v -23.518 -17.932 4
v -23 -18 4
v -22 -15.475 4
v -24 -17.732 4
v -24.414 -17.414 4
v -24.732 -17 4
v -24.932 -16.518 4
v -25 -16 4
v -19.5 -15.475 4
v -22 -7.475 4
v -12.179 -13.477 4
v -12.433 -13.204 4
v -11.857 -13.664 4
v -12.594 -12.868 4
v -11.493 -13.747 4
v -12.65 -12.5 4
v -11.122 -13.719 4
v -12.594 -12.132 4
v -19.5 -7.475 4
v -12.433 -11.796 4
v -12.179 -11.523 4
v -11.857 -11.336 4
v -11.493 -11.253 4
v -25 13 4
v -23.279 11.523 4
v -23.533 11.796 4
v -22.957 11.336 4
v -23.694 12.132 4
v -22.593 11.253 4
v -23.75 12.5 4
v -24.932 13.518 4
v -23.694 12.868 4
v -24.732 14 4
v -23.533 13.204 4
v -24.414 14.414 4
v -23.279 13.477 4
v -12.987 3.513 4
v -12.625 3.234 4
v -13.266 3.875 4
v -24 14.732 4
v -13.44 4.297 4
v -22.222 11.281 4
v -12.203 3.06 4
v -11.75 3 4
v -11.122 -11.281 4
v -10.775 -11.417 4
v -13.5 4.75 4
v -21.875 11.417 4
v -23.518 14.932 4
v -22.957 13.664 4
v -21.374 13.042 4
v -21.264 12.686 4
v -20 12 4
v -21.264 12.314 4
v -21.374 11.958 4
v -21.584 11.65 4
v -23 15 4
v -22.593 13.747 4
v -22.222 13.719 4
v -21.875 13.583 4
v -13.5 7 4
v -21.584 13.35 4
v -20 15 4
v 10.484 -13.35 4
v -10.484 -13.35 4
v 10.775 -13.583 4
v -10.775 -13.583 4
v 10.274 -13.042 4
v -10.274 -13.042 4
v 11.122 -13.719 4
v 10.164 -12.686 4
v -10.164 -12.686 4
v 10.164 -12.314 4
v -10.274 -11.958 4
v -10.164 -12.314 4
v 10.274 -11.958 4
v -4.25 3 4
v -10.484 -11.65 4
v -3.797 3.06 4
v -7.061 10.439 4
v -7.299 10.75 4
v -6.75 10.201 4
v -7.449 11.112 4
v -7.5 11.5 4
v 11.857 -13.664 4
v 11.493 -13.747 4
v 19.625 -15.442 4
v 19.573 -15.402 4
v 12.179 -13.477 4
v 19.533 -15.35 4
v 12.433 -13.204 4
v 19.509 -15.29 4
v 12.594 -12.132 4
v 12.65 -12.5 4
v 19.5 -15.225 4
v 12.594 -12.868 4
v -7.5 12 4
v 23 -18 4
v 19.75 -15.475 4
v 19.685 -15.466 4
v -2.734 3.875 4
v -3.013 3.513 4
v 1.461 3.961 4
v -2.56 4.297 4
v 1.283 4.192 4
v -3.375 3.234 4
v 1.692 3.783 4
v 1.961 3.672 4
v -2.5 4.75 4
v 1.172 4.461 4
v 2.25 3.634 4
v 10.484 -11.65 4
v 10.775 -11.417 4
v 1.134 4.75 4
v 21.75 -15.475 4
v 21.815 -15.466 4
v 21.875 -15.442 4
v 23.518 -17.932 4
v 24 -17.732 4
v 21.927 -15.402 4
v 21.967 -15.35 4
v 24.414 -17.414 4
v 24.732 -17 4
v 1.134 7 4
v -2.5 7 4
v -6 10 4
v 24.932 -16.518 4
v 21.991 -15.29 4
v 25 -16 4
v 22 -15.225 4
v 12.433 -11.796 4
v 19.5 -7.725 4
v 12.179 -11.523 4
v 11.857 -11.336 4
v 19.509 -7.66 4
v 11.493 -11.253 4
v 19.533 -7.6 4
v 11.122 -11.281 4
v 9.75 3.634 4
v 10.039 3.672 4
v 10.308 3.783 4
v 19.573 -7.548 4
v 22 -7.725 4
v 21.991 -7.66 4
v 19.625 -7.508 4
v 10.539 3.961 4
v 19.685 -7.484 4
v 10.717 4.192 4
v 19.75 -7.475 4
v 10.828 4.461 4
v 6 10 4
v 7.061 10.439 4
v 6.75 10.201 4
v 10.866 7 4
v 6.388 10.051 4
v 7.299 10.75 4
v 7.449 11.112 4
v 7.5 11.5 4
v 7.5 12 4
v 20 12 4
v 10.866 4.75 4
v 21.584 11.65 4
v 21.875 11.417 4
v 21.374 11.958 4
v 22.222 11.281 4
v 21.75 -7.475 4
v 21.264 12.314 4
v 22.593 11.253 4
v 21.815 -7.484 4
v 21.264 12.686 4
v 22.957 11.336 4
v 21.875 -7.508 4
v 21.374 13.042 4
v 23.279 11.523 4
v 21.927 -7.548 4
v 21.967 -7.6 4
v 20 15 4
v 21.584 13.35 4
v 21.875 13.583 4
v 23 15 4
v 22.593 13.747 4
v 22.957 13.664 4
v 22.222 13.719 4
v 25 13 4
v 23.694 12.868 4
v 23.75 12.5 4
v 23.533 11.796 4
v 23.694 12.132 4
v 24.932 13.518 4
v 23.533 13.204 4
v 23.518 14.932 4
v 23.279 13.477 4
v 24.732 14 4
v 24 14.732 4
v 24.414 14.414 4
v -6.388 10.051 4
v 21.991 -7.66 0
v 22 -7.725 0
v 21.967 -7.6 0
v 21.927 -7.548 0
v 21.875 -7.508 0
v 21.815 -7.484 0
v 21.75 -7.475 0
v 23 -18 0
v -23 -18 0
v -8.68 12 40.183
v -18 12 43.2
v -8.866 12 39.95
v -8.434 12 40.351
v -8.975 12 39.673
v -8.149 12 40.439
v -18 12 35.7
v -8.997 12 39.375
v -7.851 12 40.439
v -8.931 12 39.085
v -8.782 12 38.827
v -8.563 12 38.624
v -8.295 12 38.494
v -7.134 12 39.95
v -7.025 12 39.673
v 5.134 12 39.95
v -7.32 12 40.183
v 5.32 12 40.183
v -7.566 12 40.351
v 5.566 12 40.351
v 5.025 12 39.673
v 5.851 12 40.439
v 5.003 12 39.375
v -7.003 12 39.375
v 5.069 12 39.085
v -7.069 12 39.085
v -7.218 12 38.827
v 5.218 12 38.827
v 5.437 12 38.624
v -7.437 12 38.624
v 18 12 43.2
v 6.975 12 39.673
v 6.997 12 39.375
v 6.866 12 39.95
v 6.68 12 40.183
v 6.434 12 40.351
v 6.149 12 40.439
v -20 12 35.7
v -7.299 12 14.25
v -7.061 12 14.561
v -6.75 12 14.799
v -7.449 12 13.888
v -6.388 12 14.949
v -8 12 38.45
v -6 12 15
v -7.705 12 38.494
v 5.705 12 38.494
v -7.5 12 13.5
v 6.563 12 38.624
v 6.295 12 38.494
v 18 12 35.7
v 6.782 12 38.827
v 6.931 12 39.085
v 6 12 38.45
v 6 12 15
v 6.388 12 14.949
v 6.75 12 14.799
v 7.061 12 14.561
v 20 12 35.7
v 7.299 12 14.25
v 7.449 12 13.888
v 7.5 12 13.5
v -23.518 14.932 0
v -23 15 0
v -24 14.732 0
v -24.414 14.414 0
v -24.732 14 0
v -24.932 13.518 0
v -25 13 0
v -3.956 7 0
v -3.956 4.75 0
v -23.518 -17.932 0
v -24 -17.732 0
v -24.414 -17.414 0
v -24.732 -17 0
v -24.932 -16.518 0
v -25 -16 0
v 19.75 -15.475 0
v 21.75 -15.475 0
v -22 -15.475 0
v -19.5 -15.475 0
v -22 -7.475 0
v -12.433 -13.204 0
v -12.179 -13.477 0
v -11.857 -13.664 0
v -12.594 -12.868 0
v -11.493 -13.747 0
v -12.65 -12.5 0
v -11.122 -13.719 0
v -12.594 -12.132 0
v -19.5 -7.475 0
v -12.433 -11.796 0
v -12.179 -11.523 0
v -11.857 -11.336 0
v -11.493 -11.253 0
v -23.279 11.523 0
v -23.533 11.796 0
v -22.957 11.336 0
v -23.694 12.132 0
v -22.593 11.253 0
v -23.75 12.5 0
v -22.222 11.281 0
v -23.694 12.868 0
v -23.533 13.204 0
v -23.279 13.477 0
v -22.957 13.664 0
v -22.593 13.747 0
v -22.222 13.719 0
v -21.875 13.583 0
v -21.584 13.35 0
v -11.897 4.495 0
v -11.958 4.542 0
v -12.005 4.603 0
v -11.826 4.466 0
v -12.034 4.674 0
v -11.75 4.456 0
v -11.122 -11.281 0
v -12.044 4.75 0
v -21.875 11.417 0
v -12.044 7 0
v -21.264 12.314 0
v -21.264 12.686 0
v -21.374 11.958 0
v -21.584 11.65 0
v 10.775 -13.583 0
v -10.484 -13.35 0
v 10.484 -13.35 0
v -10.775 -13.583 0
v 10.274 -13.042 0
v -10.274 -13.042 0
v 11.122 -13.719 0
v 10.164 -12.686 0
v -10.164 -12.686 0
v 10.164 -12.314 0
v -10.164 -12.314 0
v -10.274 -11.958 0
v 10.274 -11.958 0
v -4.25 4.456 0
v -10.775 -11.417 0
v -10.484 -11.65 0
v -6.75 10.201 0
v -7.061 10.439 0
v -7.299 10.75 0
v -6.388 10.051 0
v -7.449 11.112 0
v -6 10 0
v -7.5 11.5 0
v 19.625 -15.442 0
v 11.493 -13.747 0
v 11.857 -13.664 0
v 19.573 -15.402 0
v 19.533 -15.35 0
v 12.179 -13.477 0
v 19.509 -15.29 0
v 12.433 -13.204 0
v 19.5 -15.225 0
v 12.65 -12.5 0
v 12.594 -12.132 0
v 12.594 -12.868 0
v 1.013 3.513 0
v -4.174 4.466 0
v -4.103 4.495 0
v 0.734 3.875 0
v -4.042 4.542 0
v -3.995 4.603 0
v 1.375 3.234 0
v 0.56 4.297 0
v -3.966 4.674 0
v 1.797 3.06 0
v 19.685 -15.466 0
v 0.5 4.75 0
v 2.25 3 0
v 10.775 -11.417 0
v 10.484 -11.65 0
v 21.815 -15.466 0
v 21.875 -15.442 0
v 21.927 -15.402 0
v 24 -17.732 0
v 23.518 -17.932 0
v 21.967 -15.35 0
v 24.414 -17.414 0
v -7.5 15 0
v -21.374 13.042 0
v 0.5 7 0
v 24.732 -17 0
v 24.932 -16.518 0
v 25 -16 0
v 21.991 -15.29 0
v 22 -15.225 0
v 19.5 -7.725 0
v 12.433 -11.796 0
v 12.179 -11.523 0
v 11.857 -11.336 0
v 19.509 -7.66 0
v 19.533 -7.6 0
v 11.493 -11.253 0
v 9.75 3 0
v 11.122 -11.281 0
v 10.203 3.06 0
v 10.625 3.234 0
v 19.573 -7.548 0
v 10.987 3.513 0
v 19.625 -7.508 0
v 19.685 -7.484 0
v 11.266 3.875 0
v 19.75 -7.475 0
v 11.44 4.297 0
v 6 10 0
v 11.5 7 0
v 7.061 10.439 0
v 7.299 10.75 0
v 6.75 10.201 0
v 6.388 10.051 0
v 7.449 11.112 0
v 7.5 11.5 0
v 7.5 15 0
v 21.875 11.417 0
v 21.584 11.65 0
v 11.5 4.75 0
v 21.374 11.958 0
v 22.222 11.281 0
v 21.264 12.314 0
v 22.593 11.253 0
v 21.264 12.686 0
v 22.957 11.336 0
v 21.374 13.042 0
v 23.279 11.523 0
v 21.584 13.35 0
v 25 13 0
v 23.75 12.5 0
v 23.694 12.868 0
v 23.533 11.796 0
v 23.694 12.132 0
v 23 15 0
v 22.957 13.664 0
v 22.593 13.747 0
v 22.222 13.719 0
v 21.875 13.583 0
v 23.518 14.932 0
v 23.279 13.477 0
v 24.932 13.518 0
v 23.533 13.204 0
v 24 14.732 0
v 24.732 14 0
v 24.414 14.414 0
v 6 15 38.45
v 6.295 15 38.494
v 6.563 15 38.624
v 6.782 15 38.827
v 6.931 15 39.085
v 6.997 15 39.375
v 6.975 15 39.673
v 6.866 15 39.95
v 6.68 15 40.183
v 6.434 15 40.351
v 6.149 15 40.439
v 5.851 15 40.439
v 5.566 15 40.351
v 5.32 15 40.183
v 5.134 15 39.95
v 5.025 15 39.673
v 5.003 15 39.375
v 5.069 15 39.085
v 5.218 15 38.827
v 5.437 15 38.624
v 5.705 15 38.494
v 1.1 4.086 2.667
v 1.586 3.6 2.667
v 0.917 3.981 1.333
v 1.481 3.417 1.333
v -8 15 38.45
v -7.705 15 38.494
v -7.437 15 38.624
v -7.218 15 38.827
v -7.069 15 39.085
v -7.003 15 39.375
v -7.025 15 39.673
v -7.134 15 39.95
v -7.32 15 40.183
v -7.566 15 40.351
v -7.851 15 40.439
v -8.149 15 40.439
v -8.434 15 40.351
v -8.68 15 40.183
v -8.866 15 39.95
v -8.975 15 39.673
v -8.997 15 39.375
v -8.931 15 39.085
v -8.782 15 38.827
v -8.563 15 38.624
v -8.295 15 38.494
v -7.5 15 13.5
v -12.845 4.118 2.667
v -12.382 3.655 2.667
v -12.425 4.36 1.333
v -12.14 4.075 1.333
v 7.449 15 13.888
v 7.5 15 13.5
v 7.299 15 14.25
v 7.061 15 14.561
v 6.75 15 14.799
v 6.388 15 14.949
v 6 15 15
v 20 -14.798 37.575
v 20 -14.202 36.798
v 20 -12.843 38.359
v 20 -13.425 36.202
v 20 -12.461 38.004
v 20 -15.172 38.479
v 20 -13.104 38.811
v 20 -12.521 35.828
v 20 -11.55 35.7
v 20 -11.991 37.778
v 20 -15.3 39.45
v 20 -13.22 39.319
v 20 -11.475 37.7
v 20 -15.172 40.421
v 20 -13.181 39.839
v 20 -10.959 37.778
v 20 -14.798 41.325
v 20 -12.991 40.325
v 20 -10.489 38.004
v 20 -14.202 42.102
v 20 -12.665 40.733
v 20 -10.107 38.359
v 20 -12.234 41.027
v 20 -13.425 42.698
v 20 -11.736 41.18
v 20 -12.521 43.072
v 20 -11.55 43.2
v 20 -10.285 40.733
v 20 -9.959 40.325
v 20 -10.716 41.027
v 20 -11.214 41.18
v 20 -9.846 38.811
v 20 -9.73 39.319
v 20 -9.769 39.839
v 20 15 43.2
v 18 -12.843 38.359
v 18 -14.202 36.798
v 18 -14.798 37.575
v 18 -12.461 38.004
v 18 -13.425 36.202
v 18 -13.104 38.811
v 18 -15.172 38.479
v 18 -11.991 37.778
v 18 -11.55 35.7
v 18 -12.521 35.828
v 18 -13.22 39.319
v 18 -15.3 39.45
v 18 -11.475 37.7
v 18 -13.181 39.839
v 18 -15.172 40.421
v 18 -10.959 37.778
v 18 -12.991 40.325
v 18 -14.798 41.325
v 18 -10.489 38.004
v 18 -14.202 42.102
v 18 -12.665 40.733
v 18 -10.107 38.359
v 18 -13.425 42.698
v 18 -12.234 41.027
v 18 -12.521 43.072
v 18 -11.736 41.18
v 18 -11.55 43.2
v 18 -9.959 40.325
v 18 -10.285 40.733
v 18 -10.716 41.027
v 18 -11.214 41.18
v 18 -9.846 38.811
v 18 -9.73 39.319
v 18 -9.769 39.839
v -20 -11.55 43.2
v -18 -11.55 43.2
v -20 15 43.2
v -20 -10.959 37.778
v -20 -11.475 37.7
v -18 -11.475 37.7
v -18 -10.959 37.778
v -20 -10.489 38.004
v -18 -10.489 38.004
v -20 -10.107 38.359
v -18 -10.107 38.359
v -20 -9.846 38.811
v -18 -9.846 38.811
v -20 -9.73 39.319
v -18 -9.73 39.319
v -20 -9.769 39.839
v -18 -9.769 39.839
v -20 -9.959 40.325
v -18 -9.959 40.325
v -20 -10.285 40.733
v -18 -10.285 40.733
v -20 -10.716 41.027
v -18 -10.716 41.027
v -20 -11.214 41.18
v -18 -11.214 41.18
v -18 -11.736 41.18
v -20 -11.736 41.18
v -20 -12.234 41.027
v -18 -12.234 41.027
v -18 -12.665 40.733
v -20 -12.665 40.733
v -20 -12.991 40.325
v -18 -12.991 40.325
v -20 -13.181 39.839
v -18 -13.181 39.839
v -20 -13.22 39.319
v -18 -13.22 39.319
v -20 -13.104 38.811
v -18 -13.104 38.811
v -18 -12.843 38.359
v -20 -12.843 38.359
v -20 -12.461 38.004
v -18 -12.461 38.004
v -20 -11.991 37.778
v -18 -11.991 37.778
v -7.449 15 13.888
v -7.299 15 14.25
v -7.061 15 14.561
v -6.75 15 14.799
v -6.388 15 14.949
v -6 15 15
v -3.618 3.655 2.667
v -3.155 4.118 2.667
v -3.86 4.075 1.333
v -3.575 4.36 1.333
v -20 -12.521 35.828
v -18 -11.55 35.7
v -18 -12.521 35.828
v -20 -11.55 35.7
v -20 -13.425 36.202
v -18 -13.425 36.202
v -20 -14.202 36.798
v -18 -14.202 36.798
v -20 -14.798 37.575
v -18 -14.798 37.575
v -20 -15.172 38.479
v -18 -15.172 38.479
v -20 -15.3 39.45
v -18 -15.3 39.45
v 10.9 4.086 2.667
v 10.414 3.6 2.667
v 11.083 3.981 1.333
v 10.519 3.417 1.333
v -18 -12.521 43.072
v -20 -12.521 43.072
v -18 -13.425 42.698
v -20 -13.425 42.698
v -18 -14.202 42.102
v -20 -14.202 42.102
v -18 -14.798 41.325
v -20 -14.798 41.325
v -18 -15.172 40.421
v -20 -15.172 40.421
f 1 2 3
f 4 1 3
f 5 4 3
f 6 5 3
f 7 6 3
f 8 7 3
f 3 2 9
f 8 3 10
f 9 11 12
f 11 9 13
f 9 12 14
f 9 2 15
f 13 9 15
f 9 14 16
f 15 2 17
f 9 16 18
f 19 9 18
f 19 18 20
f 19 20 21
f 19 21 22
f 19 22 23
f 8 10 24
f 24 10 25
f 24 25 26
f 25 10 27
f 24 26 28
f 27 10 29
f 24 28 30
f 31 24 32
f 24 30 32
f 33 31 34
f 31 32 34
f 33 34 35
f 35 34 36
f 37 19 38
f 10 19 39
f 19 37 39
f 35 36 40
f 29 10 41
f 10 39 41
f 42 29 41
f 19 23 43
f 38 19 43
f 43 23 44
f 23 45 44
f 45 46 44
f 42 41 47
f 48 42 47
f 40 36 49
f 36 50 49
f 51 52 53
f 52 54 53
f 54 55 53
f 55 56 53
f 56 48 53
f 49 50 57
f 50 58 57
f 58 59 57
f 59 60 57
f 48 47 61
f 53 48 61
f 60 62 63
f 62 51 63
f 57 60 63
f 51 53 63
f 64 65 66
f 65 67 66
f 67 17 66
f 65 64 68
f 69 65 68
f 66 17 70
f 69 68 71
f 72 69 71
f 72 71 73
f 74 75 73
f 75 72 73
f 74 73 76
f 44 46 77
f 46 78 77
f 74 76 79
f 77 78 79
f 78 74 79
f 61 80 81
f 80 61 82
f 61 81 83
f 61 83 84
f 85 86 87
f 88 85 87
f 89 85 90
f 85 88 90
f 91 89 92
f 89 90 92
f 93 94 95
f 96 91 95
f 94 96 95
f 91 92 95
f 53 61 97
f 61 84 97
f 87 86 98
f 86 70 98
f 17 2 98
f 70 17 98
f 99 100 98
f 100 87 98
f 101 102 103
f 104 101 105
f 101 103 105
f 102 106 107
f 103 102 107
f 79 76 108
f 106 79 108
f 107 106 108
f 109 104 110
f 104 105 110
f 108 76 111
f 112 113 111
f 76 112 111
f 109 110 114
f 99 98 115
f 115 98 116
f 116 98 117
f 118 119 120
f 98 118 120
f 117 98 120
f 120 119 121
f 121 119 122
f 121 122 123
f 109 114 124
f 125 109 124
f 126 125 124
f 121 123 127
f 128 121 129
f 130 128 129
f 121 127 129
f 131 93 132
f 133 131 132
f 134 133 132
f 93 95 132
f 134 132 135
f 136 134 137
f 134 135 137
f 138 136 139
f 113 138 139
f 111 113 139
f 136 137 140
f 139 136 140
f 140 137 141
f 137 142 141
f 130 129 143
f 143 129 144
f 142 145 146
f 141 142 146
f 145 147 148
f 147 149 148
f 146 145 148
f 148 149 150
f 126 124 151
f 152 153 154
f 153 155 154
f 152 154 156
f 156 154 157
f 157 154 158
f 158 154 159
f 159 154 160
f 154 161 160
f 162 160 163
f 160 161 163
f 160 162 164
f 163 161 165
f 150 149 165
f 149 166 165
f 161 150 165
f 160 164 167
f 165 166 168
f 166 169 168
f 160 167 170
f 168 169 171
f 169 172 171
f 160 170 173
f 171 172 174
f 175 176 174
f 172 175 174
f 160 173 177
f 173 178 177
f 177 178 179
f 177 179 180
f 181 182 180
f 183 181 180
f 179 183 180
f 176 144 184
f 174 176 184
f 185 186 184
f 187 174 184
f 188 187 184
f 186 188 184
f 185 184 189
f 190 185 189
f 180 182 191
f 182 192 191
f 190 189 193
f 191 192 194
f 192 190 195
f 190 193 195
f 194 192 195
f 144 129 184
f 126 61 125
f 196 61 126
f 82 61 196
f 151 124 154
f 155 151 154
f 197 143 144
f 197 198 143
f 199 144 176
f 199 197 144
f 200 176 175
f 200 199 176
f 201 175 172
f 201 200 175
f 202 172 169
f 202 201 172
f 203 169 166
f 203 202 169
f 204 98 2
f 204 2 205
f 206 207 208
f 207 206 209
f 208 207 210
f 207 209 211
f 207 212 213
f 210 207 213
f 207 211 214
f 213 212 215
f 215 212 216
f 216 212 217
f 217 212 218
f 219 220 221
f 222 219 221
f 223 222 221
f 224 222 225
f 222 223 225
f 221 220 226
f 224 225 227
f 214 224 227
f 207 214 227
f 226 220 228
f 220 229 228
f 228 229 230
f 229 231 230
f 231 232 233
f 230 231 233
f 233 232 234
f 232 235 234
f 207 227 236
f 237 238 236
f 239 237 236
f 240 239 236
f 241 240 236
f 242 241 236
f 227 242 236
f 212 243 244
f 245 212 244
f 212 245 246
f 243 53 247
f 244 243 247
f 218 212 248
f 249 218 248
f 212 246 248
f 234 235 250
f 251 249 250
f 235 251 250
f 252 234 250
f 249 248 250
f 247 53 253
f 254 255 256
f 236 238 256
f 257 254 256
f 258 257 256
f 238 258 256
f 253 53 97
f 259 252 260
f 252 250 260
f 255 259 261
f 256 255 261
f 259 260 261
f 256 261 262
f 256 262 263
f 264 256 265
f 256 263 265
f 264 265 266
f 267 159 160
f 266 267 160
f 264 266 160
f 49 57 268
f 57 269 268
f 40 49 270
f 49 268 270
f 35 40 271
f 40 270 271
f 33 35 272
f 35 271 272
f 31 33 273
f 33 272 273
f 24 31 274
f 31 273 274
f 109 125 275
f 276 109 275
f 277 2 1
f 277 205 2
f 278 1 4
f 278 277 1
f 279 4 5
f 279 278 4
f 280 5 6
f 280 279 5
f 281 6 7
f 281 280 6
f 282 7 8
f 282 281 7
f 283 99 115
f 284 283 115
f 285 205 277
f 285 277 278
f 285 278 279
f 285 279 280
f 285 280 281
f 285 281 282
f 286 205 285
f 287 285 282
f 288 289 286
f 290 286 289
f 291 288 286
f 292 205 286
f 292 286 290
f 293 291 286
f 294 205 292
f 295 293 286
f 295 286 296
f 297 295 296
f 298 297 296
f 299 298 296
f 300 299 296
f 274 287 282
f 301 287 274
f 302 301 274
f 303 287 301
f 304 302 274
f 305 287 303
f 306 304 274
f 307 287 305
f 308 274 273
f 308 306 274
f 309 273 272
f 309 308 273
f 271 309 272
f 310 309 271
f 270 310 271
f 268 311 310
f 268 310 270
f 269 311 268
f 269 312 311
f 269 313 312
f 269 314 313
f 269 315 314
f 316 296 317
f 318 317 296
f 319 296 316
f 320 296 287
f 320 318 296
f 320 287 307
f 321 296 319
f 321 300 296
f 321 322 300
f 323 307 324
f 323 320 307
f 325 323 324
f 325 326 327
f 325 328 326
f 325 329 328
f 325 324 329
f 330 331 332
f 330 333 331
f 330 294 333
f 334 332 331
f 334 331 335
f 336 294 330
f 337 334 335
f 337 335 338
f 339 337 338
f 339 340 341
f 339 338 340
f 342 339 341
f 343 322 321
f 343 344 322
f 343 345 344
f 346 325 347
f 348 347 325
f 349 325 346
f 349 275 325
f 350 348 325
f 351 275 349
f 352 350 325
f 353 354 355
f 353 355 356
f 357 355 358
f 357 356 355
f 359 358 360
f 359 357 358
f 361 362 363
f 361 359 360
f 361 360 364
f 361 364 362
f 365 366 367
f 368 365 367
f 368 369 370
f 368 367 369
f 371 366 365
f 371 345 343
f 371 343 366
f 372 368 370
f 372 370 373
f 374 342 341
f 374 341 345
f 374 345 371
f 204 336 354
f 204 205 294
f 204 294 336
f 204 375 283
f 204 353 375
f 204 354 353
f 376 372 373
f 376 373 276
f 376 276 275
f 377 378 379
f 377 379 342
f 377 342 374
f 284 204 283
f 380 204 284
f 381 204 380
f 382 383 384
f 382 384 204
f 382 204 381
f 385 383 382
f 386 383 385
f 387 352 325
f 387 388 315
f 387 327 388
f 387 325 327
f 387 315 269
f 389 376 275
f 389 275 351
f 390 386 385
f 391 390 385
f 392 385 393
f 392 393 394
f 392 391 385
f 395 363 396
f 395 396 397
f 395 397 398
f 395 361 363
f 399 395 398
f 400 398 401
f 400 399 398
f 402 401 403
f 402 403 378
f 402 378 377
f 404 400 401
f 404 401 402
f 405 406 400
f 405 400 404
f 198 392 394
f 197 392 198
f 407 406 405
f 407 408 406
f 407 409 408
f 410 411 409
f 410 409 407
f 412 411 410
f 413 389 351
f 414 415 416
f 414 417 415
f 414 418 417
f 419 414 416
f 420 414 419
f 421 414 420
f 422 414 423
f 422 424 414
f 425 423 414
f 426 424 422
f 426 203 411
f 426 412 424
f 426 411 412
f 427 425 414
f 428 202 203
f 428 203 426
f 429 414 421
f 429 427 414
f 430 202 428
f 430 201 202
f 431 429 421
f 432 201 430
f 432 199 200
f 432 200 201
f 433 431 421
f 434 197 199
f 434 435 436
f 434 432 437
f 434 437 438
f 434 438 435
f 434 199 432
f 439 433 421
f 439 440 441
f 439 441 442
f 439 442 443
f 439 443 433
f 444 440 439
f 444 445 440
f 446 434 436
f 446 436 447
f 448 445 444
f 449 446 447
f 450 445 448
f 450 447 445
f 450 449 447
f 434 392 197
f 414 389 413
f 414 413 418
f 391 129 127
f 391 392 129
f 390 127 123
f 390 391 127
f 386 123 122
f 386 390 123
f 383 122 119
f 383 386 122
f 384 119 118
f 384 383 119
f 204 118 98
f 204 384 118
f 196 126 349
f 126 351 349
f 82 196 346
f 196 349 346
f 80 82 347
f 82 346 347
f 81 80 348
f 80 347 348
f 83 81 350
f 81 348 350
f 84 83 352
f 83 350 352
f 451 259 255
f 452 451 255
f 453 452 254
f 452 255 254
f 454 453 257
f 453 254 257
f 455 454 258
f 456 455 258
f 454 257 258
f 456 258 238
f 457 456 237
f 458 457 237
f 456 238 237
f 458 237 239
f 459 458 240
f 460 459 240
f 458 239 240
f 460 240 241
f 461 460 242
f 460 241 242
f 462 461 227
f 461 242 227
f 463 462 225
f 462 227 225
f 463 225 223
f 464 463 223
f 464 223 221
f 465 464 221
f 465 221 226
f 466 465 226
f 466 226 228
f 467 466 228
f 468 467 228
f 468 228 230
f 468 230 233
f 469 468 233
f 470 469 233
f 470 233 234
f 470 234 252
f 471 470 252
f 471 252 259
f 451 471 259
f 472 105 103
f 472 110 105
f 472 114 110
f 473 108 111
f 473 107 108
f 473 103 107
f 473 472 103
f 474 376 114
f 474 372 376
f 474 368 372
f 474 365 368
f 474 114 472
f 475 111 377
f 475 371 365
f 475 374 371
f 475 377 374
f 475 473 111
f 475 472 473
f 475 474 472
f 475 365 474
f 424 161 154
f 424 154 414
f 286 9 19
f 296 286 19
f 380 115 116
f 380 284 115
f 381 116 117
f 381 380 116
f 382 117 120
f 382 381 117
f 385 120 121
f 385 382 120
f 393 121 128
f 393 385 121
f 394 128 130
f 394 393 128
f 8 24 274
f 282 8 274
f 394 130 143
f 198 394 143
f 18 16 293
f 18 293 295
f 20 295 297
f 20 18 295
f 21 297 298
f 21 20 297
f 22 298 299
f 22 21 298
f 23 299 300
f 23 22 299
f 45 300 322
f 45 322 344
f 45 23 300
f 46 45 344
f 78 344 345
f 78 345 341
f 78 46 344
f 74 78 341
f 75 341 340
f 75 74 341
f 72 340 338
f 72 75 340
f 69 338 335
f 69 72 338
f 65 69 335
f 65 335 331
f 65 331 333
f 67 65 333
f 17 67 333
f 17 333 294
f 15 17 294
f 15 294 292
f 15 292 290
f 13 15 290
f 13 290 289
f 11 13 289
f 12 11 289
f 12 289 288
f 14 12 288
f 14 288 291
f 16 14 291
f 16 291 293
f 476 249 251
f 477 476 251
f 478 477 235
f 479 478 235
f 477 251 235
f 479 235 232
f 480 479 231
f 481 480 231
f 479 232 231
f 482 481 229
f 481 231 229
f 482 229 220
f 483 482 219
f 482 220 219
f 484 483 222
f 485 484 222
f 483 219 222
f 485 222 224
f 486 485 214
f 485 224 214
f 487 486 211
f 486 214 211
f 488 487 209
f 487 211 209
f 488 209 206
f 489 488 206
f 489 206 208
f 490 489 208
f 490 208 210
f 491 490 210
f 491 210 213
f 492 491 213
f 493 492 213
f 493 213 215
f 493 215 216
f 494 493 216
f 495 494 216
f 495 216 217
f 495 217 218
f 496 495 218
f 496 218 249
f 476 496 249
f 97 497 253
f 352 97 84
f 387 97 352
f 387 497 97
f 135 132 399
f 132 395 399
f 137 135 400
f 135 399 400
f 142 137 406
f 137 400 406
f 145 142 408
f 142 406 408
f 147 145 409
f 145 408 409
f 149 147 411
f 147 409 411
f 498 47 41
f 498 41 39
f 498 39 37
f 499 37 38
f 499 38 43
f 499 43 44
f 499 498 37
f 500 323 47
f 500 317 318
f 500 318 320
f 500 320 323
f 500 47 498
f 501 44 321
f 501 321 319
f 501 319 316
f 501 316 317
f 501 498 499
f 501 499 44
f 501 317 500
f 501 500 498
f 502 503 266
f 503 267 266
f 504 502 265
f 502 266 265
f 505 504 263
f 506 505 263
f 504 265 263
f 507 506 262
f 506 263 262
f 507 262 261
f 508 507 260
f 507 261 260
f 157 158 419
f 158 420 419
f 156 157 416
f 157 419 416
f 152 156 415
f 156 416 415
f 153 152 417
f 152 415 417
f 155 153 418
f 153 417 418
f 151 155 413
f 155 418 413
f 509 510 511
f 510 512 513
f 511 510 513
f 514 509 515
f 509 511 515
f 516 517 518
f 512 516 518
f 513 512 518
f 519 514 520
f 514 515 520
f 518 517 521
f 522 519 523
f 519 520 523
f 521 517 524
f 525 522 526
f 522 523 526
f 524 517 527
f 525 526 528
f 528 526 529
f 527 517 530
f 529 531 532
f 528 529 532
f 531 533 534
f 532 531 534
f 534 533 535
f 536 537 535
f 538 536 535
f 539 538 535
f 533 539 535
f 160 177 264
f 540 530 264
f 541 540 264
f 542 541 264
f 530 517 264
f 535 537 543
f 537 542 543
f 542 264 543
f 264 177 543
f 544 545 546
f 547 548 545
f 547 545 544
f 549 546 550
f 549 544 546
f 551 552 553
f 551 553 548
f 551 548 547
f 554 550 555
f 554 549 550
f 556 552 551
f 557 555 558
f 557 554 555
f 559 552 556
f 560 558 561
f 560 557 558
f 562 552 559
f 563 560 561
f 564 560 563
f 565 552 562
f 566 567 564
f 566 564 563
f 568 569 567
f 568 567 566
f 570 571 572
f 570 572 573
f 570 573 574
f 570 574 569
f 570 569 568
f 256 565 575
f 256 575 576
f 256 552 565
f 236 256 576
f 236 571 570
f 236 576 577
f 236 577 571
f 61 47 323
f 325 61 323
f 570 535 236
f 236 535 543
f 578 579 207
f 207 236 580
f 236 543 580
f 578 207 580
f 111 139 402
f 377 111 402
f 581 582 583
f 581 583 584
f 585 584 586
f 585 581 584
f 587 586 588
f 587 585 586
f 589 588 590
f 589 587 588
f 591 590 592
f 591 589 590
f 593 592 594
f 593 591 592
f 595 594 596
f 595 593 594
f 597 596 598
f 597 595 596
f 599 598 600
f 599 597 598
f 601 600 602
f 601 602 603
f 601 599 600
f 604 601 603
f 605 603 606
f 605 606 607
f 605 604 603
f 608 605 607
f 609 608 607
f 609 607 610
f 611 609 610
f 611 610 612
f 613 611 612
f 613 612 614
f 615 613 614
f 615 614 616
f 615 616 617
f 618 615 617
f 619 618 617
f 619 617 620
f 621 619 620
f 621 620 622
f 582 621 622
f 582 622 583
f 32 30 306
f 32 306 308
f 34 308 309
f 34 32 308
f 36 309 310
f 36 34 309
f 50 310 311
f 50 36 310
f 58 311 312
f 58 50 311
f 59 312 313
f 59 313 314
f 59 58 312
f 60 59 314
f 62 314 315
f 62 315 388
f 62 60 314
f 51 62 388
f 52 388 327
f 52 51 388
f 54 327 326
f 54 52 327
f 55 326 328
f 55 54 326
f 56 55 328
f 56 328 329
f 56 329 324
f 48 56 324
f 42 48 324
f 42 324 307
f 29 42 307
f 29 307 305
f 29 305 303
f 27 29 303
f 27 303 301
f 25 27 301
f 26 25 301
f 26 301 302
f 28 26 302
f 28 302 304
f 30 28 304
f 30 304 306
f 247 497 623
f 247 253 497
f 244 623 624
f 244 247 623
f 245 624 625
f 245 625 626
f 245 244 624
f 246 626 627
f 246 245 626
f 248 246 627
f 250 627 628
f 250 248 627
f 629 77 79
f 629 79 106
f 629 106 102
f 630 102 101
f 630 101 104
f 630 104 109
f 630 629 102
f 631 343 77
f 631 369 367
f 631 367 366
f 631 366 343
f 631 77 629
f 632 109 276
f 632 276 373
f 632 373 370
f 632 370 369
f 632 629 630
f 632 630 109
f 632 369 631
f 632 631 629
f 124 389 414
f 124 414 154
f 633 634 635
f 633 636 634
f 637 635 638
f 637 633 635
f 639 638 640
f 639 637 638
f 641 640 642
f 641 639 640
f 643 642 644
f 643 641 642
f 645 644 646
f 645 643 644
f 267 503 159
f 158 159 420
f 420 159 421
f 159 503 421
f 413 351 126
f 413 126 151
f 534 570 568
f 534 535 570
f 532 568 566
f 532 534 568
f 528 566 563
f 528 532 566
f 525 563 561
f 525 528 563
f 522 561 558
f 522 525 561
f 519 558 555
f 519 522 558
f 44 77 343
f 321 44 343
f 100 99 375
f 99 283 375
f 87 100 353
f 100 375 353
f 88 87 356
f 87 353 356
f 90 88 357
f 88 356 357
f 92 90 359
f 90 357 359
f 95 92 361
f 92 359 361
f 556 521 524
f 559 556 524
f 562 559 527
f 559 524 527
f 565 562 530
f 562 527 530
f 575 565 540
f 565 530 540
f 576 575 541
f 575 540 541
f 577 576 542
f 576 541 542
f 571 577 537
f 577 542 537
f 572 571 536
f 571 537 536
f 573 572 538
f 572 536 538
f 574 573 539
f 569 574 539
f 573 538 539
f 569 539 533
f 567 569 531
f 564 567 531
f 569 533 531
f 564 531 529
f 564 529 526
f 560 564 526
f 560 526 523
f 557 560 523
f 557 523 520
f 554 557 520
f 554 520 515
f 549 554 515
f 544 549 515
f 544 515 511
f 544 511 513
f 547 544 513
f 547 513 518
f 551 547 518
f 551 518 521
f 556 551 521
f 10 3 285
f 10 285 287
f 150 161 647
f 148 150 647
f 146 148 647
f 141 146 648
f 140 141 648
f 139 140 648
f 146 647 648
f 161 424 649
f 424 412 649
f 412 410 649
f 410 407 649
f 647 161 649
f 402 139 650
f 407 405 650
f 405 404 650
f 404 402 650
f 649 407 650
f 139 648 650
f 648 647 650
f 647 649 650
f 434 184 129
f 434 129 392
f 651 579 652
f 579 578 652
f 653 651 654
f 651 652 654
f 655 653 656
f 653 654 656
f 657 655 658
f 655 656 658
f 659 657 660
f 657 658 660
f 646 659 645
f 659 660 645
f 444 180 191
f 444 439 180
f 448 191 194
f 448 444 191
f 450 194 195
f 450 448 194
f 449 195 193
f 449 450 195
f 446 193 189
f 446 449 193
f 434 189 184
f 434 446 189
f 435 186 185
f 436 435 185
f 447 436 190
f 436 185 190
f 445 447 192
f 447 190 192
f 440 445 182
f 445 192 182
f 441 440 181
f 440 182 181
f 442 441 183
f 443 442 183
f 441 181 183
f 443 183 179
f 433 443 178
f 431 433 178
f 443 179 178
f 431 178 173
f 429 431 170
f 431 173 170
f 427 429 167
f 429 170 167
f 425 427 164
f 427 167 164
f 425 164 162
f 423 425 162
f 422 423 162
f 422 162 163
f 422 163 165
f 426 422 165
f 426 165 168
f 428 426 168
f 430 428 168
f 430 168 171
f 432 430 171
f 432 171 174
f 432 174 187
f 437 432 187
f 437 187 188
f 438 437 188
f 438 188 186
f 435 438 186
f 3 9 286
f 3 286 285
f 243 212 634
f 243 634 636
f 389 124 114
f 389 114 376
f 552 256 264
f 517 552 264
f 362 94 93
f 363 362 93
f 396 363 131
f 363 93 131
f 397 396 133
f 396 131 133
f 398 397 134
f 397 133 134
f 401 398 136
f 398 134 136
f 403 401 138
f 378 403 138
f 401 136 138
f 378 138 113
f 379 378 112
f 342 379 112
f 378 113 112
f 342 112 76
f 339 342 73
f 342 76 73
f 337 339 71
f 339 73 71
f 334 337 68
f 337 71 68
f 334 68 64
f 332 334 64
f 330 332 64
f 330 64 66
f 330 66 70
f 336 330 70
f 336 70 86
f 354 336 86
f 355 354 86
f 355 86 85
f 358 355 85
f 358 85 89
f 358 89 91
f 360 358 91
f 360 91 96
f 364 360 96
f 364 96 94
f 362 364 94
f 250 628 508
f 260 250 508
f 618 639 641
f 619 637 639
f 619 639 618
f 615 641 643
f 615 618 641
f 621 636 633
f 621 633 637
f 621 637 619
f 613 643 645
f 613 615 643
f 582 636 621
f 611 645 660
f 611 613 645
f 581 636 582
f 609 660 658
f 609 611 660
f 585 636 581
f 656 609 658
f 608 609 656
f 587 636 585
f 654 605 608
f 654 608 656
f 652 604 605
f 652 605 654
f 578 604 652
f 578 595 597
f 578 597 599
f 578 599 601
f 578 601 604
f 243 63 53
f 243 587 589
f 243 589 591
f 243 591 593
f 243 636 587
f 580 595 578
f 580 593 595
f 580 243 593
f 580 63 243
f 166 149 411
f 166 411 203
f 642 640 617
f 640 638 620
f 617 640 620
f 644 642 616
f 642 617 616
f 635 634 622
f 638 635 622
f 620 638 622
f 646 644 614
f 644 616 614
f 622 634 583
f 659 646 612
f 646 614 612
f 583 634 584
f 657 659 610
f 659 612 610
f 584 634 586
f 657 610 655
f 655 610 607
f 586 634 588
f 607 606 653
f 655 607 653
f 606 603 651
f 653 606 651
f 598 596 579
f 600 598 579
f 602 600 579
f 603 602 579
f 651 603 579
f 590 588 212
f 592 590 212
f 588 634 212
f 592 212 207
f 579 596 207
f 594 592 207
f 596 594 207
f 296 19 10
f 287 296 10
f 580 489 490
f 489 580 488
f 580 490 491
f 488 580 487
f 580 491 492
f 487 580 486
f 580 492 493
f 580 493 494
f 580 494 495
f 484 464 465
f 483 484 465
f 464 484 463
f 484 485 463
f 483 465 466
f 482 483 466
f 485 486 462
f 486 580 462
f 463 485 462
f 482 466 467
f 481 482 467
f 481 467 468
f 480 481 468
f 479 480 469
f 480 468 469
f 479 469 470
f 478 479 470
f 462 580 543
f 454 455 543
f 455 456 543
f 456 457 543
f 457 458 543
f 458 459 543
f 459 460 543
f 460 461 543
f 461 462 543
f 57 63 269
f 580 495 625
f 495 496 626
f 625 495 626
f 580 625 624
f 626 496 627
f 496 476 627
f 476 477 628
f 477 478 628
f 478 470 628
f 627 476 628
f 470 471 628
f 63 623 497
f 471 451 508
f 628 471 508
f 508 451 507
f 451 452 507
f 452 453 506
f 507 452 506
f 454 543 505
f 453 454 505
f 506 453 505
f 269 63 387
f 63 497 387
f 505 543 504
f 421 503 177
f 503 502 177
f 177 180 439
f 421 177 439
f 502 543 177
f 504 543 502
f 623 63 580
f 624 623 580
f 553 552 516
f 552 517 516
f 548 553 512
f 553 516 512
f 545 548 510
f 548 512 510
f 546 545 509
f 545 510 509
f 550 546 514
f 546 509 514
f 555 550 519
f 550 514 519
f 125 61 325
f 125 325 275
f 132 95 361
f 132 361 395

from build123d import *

# Parameters (mm, degrees)
SKETCH1_W             = 40
SKETCH1_H             = 33
BOSS_EXTRUDE1_DEPTH   = 4
SKETCH3_W             = 40
SKETCH3_H             = 3
BOSS_EXTRUDE2_DEPTH   = 39.2
SKETCH10_W            = 2
SKETCH10_H            = 7.5
BOSS_EXTRUDE3_DEPTH   = 27.3
SKETCH12_W            = 4
SKETCH12_H            = 33
BOSS_EXTRUDE4_DEPTH   = 5
SKETCH13_W            = 2.5
SKETCH13_H            = 8
CUT_EXTRUDE5_DEPTH    = 50.856193196
CUT_EXTRUDE6_REACH    = 63.565
SKETCH15_R            = 1.75
FILLET6_R             = 3.75
CUT_EXTRUDE8_REACH    = 51.856
SKETCH23_R            = 1.25
FILLET8_R             = 2
SKETCH25_R            = 1
CUT_EXTRUDE10_DEPTH   = 59.234354122
SKETCH26_W            = 8
SKETCH26_H            = 2.5
CUT_EXTRUDE11_DEPTH   = 50.856193196
FILLET3_R             = 0.25
FILLET6_OF_MIRROR10_R = 3.75
FILLET8_OF_MIRROR10_R = 2
SKETCH28_W            = 8
SKETCH28_H            = 2.5
CUT_EXTRUDE12_DEPTH   = 50.856193196
FILLET9_R             = 0.25
CHAMFER1_SIZE         = 1.5
CHAMFER1_SIZE_2       = 4.121216129
CHAMFER2_SIZE         = 9.470627272
CHAMFER2_SIZE_2       = 1.5
SKETCH29_W            = 15
SKETCH29_H            = 15
CUT_EXTRUDE13_DEPTH   = 5
FILLET10_R            = 1.5


# Some blends are built 0.0001 mm under size
with BuildPart() as part:
    # Sketch1 → Boss-Extrude1 (new body)
    with BuildSketch(Plane.XY):
        with Locations((0, -1.5)):
            Rectangle(SKETCH1_W, SKETCH1_H)
    extrude(amount=BOSS_EXTRUDE1_DEPTH)

    # Sketch3 → Boss-Extrude2 (add)
    with BuildSketch(Plane.XY.offset(4)):
        with Locations((0, 13.5)):
            Rectangle(SKETCH3_W, SKETCH3_H)
    extrude(amount=BOSS_EXTRUDE2_DEPTH)

    # Sketch10 → Boss-Extrude3 (add)
    with BuildSketch(Plane.XZ.offset(-12)):
        with Locations((19, 39.45)):
            Rectangle(SKETCH10_W, SKETCH10_H)
    boss_extrude3 = extrude(amount=BOSS_EXTRUDE3_DEPTH)

    # Sketch12 → Boss-Extrude4 (add)
    with BuildSketch(Plane(origin=(20, 0, 0), x_dir=(0, 0, -1), z_dir=(1, 0, 0))):
        with Locations((-2, -1.5)):
            Rectangle(SKETCH12_W, SKETCH12_H)
    boss_extrude4 = extrude(amount=BOSS_EXTRUDE4_DEPTH)

    # Sketch13 → Cut-Extrude5 (cut, through all)
    with BuildSketch(Plane.XY.offset(4)):
        with Locations((20.75, -11.475)):
            Rectangle(SKETCH13_W, SKETCH13_H)
    cut_extrude5 = extrude(amount=-CUT_EXTRUDE5_DEPTH, mode=Mode.SUBTRACT)

    # Sketch15 → Cut-Extrude6 (cut, up to next)
    with BuildSketch(Plane(origin=(20, 0, 0), x_dir=(0, 0, -1), z_dir=(1, 0, 0)), mode=Mode.PRIVATE) as cut_extrude6_sk1:
        with Locations((-39.45, -11.475)):
            Circle(SKETCH15_R)
    cut_extrude6_tool1 = extrude(cut_extrude6_sk1.sketch, amount=-CUT_EXTRUDE6_REACH, mode=Mode.PRIVATE) & part.part
    cut_extrude6 = cut_extrude6_tool1.solids().sort_by_distance((20, -11.475, 39.45))[0]
    add(cut_extrude6, mode=Mode.SUBTRACT)

    # Fillet6
    fillet6_edges = [part.edges().sort_by_distance(p)[0] for p in [
        (19, -15.3, 35.7),
        (19, -15.3, 43.2),
    ]]
    fillet(fillet6_edges, radius=FILLET6_R - 0.0001)  # a hair under: the kernel refuses the full size

    # Sketch23 → Cut-Extrude8 (cut, up to next)
    with BuildSketch(Plane.XY.offset(4), mode=Mode.PRIVATE) as cut_extrude8_sk1:
        with Locations((11.4, -12.5)):
            Circle(SKETCH23_R)
    cut_extrude8_tool1 = extrude(cut_extrude8_sk1.sketch, amount=-CUT_EXTRUDE8_REACH, mode=Mode.PRIVATE) & part.part
    # Sketch23 → Cut-Extrude8 (cut, up to next)
    with BuildSketch(Plane.XY.offset(4), mode=Mode.PRIVATE) as cut_extrude8_sk2:
        with Locations((22.5, 12.5)):
            Circle(SKETCH23_R)
    cut_extrude8_tool2 = extrude(cut_extrude8_sk2.sketch, amount=-CUT_EXTRUDE8_REACH, mode=Mode.PRIVATE) & part.part
    cut_extrude8_1 = cut_extrude8_tool1.solids().sort_by_distance((11.4, -12.5, 4))[0]
    add(cut_extrude8_1, mode=Mode.SUBTRACT)
    cut_extrude8_2 = cut_extrude8_tool2.solids().sort_by_distance((22.5, 12.5, 4))[0]
    add(cut_extrude8_2, mode=Mode.SUBTRACT)
    cut_extrude8 = cut_extrude8_1 + cut_extrude8_2  # Cut-Extrude8 as one shape, for the pattern or mirror that repeats it

    # Fillet8
    fillet8_edges = [part.edges().sort_by_distance(p)[0] for p in [
        (25, 15, 2),
        (25, -18, 2),
    ]]
    fillet(fillet8_edges, radius=FILLET8_R)

    # Sketch25 → Cut-Extrude10 (cut, through all)
    with BuildSketch(Plane.XZ.offset(-12)):
        with Locations(Location((6, 39.45, 0), (0, 0, 270))):
            Circle(SKETCH25_R)
        with Locations(Location((-8, 39.45, 0), (0, 0, 270))):
            Circle(SKETCH25_R)
    extrude(amount=-CUT_EXTRUDE10_DEPTH, mode=Mode.SUBTRACT)

    # Sketch26 → Cut-Extrude11 (cut, through all)
    with BuildSketch(Plane.XY.offset(4)):
        with Locations((6, 5.75)):
            Rectangle(SKETCH26_W, SKETCH26_H)
    extrude(amount=-CUT_EXTRUDE11_DEPTH, mode=Mode.SUBTRACT)

    # Fillet3
    fillet3_edges = [part.edges().sort_by_distance(p)[0] for p in [
        (22, -7.475, 2),
        (22, -15.475, 2),
        (19.5, -15.475, 2),
        (19.5, -7.475, 2),
    ]]
    fillet(fillet3_edges, radius=FILLET3_R)

    # Mirror10: Boss-Extrude3, Boss-Extrude4, Cut-Extrude5, Cut-Extrude6, Cut-Extrude8 across plane
    add(boss_extrude3.mirror(Plane(origin=(0, 0, 0), x_dir=(0, 0, 1), z_dir=(1, 0, 0))))
    add(boss_extrude4.mirror(Plane(origin=(0, 0, 0), x_dir=(0, 0, 1), z_dir=(1, 0, 0))))
    add(cut_extrude5.mirror(Plane(origin=(0, 0, 0), x_dir=(0, 0, 1), z_dir=(1, 0, 0))), mode=Mode.SUBTRACT)
    add(cut_extrude6.mirror(Plane(origin=(0, 0, 0), x_dir=(0, 0, 1), z_dir=(1, 0, 0))), mode=Mode.SUBTRACT)
    add(cut_extrude8.mirror(Plane(origin=(0, 0, 0), x_dir=(0, 0, 1), z_dir=(1, 0, 0))), mode=Mode.SUBTRACT)

    # Fillet6 of Mirror10
    fillet6_of_mirror10_edges = [part.edges().sort_by_distance(p)[0] for p in [
        (-19, -15.3, 35.7),
        (-19, -15.3, 43.2),
    ]]
    fillet(fillet6_of_mirror10_edges, radius=FILLET6_OF_MIRROR10_R - 0.0001)  # a hair under: the kernel refuses the full size

    # Fillet8 of Mirror10
    fillet8_of_mirror10_edges = [part.edges().sort_by_distance(p)[0] for p in [
        (-25, 15, 2),
        (-25, -18, 2),
    ]]
    fillet(fillet8_of_mirror10_edges, radius=FILLET8_OF_MIRROR10_R)

    # Sketch28 → Cut-Extrude12 (cut, through all)
    with BuildSketch(Plane.XY.offset(4)):
        with Locations((-8, 5.75)):
            Rectangle(SKETCH28_W, SKETCH28_H)
    extrude(amount=-CUT_EXTRUDE12_DEPTH, mode=Mode.SUBTRACT)

    # Fillet9
    fillet9_edges = [part.edges().sort_by_distance(p)[0] for p in [
        (10, 4.5, 2),
        (2, 4.5, 2),
        (-12, 4.5, 2),
        (-4, 4.5, 2),
    ]]
    fillet(fillet9_edges, radius=FILLET9_R)

    # Chamfer1
    # the kernel refuses this chamfer: 4.121216129, 1.5 mm, written as the material it takes off along each edge
    with BuildSketch(Plane(origin=(-12, 4.75, 4), x_dir=(-0.9950833631817486, 0, 0.09904090225205062), z_dir=(0, 1, 0)), Plane(origin=(-4, 7, 4), x_dir=(0.9950833631817486, 0, 0.09904090225205064), z_dir=(0, -1, 0))) as chamfer1_piece_1:
        Polygon((CHAMFER1_SIZE * 0.995083363182, -CHAMFER1_SIZE * 0.0990409022521), (-CHAMFER1_SIZE_2 * 0.0990409022564, -CHAMFER1_SIZE_2 * 0.995083363226), (0, 0), align=None)
    extrude(amount=2.25, mode=Mode.SUBTRACT)
    with BuildSketch(Plane(origin=(-11.75, 4.75, 4), x_dir=(-1, 0, 0), z_dir=(0, 1, 0))) as chamfer1_piece_2:
        Polygon((0.25 + CHAMFER1_SIZE, 0), (0.25, -CHAMFER1_SIZE_2), (0.25, 0), align=None)
    revolve(axis=Axis((-11.75, 4.75, 4), (0, 0, 1)), revolution_arc=90, mode=Mode.SUBTRACT)
    with BuildSketch(Plane(origin=(-4.25, 4.75, 4), x_dir=(0, -1, 0), z_dir=(-1, 0, 0))) as chamfer1_piece_3:
        Polygon((0.25 + CHAMFER1_SIZE, 0), (0.25, -CHAMFER1_SIZE_2), (0.25, 0), align=None)
    revolve(axis=Axis((-4.25, 4.75, 4), (0, 0, 1)), revolution_arc=90, mode=Mode.SUBTRACT)
    with BuildSketch(Plane(origin=(-4.25, 4.5, 4), x_dir=(0, -0.9950833631817486, 0.09904090225205064), z_dir=(-1, 0, 0))) as chamfer1_piece_4:
        Polygon((CHAMFER1_SIZE * 0.995083363182, -CHAMFER1_SIZE * 0.0990409022521), (-CHAMFER1_SIZE_2 * 0.0990409022564, -CHAMFER1_SIZE_2 * 0.995083363226), (0, 0), align=None)
    extrude(amount=7.5, mode=Mode.SUBTRACT)

    # Chamfer2
    # the kernel refuses this chamfer: 9.470627272, 1.5 mm, written as the material it takes off along each edge
    with BuildSketch(Plane(origin=(2, 7, 0), x_dir=(0.006019451551713046, 0, 0.9999818829373942), z_dir=(0, -1, 0)), Plane(origin=(10, 4.75, 0), x_dir=(-0.006019451551713001, 0, 0.9999818829373942), z_dir=(0, 1, 0))) as chamfer2_piece_1:
        Polygon((CHAMFER2_SIZE * 0.999981882939, CHAMFER2_SIZE * 0.00601945155172), (-CHAMFER2_SIZE_2 * 0.00601945155171, CHAMFER2_SIZE_2 * 0.999981882937), (0, 0), align=None)
    extrude(amount=2.25, mode=Mode.SUBTRACT)
    with BuildSketch(Plane(origin=(2.25, 4.75, 0), x_dir=(-1, 0, 0), z_dir=(0, 1, 0))) as chamfer2_piece_2:
        Polygon((0.25, CHAMFER2_SIZE), (0.25 + CHAMFER2_SIZE_2, 0), (0.25, 0), align=None)
    revolve(axis=Axis((2.25, 4.75, 0), (0, 0, 1)), revolution_arc=90, mode=Mode.SUBTRACT)
    with BuildSketch(Plane(origin=(9.75, 4.75, 0), x_dir=(1, 0, 0), z_dir=(0, 1, 0))) as chamfer2_piece_3:
        Polygon((0.25, -CHAMFER2_SIZE), (0.25 + CHAMFER2_SIZE_2, 0), (0.25, 0), align=None)
    revolve(axis=Axis((9.75, 4.75, 0), (0, 0, -1)), revolution_arc=90, mode=Mode.SUBTRACT)
    with BuildSketch(Plane(origin=(2.25, 4.5, 0), x_dir=(0, 0.006019451551713091, 0.9999818829373942), z_dir=(1, 0, 0))) as chamfer2_piece_4:
        Polygon((CHAMFER2_SIZE * 0.999981882939, CHAMFER2_SIZE * 0.00601945155172), (-CHAMFER2_SIZE_2 * 0.00601945155171, CHAMFER2_SIZE_2 * 0.999981882937), (0, 0), align=None)
    extrude(amount=7.5, mode=Mode.SUBTRACT)

    # Sketch29 → Cut-Extrude13 (cut)
    with BuildSketch(Plane(origin=(0, 15, 0), x_dir=(1, 0, 0), z_dir=(0, 1, 0))):
        with Locations((0, -7.5)):
            Rectangle(SKETCH29_W, SKETCH29_H)
    extrude(amount=-CUT_EXTRUDE13_DEPTH, mode=Mode.SUBTRACT)

    # Fillet10
    fillet10_edges = [part.edges().sort_by_distance(p)[0] for p in [
        (-7.5, 10, 2),
        (-7.5, 13.5, 15),
        (7.5, 10, 2),
        (7.5, 13.5, 15),
    ]]
    fillet(fillet10_edges, radius=FILLET10_R)


solid = part.part
